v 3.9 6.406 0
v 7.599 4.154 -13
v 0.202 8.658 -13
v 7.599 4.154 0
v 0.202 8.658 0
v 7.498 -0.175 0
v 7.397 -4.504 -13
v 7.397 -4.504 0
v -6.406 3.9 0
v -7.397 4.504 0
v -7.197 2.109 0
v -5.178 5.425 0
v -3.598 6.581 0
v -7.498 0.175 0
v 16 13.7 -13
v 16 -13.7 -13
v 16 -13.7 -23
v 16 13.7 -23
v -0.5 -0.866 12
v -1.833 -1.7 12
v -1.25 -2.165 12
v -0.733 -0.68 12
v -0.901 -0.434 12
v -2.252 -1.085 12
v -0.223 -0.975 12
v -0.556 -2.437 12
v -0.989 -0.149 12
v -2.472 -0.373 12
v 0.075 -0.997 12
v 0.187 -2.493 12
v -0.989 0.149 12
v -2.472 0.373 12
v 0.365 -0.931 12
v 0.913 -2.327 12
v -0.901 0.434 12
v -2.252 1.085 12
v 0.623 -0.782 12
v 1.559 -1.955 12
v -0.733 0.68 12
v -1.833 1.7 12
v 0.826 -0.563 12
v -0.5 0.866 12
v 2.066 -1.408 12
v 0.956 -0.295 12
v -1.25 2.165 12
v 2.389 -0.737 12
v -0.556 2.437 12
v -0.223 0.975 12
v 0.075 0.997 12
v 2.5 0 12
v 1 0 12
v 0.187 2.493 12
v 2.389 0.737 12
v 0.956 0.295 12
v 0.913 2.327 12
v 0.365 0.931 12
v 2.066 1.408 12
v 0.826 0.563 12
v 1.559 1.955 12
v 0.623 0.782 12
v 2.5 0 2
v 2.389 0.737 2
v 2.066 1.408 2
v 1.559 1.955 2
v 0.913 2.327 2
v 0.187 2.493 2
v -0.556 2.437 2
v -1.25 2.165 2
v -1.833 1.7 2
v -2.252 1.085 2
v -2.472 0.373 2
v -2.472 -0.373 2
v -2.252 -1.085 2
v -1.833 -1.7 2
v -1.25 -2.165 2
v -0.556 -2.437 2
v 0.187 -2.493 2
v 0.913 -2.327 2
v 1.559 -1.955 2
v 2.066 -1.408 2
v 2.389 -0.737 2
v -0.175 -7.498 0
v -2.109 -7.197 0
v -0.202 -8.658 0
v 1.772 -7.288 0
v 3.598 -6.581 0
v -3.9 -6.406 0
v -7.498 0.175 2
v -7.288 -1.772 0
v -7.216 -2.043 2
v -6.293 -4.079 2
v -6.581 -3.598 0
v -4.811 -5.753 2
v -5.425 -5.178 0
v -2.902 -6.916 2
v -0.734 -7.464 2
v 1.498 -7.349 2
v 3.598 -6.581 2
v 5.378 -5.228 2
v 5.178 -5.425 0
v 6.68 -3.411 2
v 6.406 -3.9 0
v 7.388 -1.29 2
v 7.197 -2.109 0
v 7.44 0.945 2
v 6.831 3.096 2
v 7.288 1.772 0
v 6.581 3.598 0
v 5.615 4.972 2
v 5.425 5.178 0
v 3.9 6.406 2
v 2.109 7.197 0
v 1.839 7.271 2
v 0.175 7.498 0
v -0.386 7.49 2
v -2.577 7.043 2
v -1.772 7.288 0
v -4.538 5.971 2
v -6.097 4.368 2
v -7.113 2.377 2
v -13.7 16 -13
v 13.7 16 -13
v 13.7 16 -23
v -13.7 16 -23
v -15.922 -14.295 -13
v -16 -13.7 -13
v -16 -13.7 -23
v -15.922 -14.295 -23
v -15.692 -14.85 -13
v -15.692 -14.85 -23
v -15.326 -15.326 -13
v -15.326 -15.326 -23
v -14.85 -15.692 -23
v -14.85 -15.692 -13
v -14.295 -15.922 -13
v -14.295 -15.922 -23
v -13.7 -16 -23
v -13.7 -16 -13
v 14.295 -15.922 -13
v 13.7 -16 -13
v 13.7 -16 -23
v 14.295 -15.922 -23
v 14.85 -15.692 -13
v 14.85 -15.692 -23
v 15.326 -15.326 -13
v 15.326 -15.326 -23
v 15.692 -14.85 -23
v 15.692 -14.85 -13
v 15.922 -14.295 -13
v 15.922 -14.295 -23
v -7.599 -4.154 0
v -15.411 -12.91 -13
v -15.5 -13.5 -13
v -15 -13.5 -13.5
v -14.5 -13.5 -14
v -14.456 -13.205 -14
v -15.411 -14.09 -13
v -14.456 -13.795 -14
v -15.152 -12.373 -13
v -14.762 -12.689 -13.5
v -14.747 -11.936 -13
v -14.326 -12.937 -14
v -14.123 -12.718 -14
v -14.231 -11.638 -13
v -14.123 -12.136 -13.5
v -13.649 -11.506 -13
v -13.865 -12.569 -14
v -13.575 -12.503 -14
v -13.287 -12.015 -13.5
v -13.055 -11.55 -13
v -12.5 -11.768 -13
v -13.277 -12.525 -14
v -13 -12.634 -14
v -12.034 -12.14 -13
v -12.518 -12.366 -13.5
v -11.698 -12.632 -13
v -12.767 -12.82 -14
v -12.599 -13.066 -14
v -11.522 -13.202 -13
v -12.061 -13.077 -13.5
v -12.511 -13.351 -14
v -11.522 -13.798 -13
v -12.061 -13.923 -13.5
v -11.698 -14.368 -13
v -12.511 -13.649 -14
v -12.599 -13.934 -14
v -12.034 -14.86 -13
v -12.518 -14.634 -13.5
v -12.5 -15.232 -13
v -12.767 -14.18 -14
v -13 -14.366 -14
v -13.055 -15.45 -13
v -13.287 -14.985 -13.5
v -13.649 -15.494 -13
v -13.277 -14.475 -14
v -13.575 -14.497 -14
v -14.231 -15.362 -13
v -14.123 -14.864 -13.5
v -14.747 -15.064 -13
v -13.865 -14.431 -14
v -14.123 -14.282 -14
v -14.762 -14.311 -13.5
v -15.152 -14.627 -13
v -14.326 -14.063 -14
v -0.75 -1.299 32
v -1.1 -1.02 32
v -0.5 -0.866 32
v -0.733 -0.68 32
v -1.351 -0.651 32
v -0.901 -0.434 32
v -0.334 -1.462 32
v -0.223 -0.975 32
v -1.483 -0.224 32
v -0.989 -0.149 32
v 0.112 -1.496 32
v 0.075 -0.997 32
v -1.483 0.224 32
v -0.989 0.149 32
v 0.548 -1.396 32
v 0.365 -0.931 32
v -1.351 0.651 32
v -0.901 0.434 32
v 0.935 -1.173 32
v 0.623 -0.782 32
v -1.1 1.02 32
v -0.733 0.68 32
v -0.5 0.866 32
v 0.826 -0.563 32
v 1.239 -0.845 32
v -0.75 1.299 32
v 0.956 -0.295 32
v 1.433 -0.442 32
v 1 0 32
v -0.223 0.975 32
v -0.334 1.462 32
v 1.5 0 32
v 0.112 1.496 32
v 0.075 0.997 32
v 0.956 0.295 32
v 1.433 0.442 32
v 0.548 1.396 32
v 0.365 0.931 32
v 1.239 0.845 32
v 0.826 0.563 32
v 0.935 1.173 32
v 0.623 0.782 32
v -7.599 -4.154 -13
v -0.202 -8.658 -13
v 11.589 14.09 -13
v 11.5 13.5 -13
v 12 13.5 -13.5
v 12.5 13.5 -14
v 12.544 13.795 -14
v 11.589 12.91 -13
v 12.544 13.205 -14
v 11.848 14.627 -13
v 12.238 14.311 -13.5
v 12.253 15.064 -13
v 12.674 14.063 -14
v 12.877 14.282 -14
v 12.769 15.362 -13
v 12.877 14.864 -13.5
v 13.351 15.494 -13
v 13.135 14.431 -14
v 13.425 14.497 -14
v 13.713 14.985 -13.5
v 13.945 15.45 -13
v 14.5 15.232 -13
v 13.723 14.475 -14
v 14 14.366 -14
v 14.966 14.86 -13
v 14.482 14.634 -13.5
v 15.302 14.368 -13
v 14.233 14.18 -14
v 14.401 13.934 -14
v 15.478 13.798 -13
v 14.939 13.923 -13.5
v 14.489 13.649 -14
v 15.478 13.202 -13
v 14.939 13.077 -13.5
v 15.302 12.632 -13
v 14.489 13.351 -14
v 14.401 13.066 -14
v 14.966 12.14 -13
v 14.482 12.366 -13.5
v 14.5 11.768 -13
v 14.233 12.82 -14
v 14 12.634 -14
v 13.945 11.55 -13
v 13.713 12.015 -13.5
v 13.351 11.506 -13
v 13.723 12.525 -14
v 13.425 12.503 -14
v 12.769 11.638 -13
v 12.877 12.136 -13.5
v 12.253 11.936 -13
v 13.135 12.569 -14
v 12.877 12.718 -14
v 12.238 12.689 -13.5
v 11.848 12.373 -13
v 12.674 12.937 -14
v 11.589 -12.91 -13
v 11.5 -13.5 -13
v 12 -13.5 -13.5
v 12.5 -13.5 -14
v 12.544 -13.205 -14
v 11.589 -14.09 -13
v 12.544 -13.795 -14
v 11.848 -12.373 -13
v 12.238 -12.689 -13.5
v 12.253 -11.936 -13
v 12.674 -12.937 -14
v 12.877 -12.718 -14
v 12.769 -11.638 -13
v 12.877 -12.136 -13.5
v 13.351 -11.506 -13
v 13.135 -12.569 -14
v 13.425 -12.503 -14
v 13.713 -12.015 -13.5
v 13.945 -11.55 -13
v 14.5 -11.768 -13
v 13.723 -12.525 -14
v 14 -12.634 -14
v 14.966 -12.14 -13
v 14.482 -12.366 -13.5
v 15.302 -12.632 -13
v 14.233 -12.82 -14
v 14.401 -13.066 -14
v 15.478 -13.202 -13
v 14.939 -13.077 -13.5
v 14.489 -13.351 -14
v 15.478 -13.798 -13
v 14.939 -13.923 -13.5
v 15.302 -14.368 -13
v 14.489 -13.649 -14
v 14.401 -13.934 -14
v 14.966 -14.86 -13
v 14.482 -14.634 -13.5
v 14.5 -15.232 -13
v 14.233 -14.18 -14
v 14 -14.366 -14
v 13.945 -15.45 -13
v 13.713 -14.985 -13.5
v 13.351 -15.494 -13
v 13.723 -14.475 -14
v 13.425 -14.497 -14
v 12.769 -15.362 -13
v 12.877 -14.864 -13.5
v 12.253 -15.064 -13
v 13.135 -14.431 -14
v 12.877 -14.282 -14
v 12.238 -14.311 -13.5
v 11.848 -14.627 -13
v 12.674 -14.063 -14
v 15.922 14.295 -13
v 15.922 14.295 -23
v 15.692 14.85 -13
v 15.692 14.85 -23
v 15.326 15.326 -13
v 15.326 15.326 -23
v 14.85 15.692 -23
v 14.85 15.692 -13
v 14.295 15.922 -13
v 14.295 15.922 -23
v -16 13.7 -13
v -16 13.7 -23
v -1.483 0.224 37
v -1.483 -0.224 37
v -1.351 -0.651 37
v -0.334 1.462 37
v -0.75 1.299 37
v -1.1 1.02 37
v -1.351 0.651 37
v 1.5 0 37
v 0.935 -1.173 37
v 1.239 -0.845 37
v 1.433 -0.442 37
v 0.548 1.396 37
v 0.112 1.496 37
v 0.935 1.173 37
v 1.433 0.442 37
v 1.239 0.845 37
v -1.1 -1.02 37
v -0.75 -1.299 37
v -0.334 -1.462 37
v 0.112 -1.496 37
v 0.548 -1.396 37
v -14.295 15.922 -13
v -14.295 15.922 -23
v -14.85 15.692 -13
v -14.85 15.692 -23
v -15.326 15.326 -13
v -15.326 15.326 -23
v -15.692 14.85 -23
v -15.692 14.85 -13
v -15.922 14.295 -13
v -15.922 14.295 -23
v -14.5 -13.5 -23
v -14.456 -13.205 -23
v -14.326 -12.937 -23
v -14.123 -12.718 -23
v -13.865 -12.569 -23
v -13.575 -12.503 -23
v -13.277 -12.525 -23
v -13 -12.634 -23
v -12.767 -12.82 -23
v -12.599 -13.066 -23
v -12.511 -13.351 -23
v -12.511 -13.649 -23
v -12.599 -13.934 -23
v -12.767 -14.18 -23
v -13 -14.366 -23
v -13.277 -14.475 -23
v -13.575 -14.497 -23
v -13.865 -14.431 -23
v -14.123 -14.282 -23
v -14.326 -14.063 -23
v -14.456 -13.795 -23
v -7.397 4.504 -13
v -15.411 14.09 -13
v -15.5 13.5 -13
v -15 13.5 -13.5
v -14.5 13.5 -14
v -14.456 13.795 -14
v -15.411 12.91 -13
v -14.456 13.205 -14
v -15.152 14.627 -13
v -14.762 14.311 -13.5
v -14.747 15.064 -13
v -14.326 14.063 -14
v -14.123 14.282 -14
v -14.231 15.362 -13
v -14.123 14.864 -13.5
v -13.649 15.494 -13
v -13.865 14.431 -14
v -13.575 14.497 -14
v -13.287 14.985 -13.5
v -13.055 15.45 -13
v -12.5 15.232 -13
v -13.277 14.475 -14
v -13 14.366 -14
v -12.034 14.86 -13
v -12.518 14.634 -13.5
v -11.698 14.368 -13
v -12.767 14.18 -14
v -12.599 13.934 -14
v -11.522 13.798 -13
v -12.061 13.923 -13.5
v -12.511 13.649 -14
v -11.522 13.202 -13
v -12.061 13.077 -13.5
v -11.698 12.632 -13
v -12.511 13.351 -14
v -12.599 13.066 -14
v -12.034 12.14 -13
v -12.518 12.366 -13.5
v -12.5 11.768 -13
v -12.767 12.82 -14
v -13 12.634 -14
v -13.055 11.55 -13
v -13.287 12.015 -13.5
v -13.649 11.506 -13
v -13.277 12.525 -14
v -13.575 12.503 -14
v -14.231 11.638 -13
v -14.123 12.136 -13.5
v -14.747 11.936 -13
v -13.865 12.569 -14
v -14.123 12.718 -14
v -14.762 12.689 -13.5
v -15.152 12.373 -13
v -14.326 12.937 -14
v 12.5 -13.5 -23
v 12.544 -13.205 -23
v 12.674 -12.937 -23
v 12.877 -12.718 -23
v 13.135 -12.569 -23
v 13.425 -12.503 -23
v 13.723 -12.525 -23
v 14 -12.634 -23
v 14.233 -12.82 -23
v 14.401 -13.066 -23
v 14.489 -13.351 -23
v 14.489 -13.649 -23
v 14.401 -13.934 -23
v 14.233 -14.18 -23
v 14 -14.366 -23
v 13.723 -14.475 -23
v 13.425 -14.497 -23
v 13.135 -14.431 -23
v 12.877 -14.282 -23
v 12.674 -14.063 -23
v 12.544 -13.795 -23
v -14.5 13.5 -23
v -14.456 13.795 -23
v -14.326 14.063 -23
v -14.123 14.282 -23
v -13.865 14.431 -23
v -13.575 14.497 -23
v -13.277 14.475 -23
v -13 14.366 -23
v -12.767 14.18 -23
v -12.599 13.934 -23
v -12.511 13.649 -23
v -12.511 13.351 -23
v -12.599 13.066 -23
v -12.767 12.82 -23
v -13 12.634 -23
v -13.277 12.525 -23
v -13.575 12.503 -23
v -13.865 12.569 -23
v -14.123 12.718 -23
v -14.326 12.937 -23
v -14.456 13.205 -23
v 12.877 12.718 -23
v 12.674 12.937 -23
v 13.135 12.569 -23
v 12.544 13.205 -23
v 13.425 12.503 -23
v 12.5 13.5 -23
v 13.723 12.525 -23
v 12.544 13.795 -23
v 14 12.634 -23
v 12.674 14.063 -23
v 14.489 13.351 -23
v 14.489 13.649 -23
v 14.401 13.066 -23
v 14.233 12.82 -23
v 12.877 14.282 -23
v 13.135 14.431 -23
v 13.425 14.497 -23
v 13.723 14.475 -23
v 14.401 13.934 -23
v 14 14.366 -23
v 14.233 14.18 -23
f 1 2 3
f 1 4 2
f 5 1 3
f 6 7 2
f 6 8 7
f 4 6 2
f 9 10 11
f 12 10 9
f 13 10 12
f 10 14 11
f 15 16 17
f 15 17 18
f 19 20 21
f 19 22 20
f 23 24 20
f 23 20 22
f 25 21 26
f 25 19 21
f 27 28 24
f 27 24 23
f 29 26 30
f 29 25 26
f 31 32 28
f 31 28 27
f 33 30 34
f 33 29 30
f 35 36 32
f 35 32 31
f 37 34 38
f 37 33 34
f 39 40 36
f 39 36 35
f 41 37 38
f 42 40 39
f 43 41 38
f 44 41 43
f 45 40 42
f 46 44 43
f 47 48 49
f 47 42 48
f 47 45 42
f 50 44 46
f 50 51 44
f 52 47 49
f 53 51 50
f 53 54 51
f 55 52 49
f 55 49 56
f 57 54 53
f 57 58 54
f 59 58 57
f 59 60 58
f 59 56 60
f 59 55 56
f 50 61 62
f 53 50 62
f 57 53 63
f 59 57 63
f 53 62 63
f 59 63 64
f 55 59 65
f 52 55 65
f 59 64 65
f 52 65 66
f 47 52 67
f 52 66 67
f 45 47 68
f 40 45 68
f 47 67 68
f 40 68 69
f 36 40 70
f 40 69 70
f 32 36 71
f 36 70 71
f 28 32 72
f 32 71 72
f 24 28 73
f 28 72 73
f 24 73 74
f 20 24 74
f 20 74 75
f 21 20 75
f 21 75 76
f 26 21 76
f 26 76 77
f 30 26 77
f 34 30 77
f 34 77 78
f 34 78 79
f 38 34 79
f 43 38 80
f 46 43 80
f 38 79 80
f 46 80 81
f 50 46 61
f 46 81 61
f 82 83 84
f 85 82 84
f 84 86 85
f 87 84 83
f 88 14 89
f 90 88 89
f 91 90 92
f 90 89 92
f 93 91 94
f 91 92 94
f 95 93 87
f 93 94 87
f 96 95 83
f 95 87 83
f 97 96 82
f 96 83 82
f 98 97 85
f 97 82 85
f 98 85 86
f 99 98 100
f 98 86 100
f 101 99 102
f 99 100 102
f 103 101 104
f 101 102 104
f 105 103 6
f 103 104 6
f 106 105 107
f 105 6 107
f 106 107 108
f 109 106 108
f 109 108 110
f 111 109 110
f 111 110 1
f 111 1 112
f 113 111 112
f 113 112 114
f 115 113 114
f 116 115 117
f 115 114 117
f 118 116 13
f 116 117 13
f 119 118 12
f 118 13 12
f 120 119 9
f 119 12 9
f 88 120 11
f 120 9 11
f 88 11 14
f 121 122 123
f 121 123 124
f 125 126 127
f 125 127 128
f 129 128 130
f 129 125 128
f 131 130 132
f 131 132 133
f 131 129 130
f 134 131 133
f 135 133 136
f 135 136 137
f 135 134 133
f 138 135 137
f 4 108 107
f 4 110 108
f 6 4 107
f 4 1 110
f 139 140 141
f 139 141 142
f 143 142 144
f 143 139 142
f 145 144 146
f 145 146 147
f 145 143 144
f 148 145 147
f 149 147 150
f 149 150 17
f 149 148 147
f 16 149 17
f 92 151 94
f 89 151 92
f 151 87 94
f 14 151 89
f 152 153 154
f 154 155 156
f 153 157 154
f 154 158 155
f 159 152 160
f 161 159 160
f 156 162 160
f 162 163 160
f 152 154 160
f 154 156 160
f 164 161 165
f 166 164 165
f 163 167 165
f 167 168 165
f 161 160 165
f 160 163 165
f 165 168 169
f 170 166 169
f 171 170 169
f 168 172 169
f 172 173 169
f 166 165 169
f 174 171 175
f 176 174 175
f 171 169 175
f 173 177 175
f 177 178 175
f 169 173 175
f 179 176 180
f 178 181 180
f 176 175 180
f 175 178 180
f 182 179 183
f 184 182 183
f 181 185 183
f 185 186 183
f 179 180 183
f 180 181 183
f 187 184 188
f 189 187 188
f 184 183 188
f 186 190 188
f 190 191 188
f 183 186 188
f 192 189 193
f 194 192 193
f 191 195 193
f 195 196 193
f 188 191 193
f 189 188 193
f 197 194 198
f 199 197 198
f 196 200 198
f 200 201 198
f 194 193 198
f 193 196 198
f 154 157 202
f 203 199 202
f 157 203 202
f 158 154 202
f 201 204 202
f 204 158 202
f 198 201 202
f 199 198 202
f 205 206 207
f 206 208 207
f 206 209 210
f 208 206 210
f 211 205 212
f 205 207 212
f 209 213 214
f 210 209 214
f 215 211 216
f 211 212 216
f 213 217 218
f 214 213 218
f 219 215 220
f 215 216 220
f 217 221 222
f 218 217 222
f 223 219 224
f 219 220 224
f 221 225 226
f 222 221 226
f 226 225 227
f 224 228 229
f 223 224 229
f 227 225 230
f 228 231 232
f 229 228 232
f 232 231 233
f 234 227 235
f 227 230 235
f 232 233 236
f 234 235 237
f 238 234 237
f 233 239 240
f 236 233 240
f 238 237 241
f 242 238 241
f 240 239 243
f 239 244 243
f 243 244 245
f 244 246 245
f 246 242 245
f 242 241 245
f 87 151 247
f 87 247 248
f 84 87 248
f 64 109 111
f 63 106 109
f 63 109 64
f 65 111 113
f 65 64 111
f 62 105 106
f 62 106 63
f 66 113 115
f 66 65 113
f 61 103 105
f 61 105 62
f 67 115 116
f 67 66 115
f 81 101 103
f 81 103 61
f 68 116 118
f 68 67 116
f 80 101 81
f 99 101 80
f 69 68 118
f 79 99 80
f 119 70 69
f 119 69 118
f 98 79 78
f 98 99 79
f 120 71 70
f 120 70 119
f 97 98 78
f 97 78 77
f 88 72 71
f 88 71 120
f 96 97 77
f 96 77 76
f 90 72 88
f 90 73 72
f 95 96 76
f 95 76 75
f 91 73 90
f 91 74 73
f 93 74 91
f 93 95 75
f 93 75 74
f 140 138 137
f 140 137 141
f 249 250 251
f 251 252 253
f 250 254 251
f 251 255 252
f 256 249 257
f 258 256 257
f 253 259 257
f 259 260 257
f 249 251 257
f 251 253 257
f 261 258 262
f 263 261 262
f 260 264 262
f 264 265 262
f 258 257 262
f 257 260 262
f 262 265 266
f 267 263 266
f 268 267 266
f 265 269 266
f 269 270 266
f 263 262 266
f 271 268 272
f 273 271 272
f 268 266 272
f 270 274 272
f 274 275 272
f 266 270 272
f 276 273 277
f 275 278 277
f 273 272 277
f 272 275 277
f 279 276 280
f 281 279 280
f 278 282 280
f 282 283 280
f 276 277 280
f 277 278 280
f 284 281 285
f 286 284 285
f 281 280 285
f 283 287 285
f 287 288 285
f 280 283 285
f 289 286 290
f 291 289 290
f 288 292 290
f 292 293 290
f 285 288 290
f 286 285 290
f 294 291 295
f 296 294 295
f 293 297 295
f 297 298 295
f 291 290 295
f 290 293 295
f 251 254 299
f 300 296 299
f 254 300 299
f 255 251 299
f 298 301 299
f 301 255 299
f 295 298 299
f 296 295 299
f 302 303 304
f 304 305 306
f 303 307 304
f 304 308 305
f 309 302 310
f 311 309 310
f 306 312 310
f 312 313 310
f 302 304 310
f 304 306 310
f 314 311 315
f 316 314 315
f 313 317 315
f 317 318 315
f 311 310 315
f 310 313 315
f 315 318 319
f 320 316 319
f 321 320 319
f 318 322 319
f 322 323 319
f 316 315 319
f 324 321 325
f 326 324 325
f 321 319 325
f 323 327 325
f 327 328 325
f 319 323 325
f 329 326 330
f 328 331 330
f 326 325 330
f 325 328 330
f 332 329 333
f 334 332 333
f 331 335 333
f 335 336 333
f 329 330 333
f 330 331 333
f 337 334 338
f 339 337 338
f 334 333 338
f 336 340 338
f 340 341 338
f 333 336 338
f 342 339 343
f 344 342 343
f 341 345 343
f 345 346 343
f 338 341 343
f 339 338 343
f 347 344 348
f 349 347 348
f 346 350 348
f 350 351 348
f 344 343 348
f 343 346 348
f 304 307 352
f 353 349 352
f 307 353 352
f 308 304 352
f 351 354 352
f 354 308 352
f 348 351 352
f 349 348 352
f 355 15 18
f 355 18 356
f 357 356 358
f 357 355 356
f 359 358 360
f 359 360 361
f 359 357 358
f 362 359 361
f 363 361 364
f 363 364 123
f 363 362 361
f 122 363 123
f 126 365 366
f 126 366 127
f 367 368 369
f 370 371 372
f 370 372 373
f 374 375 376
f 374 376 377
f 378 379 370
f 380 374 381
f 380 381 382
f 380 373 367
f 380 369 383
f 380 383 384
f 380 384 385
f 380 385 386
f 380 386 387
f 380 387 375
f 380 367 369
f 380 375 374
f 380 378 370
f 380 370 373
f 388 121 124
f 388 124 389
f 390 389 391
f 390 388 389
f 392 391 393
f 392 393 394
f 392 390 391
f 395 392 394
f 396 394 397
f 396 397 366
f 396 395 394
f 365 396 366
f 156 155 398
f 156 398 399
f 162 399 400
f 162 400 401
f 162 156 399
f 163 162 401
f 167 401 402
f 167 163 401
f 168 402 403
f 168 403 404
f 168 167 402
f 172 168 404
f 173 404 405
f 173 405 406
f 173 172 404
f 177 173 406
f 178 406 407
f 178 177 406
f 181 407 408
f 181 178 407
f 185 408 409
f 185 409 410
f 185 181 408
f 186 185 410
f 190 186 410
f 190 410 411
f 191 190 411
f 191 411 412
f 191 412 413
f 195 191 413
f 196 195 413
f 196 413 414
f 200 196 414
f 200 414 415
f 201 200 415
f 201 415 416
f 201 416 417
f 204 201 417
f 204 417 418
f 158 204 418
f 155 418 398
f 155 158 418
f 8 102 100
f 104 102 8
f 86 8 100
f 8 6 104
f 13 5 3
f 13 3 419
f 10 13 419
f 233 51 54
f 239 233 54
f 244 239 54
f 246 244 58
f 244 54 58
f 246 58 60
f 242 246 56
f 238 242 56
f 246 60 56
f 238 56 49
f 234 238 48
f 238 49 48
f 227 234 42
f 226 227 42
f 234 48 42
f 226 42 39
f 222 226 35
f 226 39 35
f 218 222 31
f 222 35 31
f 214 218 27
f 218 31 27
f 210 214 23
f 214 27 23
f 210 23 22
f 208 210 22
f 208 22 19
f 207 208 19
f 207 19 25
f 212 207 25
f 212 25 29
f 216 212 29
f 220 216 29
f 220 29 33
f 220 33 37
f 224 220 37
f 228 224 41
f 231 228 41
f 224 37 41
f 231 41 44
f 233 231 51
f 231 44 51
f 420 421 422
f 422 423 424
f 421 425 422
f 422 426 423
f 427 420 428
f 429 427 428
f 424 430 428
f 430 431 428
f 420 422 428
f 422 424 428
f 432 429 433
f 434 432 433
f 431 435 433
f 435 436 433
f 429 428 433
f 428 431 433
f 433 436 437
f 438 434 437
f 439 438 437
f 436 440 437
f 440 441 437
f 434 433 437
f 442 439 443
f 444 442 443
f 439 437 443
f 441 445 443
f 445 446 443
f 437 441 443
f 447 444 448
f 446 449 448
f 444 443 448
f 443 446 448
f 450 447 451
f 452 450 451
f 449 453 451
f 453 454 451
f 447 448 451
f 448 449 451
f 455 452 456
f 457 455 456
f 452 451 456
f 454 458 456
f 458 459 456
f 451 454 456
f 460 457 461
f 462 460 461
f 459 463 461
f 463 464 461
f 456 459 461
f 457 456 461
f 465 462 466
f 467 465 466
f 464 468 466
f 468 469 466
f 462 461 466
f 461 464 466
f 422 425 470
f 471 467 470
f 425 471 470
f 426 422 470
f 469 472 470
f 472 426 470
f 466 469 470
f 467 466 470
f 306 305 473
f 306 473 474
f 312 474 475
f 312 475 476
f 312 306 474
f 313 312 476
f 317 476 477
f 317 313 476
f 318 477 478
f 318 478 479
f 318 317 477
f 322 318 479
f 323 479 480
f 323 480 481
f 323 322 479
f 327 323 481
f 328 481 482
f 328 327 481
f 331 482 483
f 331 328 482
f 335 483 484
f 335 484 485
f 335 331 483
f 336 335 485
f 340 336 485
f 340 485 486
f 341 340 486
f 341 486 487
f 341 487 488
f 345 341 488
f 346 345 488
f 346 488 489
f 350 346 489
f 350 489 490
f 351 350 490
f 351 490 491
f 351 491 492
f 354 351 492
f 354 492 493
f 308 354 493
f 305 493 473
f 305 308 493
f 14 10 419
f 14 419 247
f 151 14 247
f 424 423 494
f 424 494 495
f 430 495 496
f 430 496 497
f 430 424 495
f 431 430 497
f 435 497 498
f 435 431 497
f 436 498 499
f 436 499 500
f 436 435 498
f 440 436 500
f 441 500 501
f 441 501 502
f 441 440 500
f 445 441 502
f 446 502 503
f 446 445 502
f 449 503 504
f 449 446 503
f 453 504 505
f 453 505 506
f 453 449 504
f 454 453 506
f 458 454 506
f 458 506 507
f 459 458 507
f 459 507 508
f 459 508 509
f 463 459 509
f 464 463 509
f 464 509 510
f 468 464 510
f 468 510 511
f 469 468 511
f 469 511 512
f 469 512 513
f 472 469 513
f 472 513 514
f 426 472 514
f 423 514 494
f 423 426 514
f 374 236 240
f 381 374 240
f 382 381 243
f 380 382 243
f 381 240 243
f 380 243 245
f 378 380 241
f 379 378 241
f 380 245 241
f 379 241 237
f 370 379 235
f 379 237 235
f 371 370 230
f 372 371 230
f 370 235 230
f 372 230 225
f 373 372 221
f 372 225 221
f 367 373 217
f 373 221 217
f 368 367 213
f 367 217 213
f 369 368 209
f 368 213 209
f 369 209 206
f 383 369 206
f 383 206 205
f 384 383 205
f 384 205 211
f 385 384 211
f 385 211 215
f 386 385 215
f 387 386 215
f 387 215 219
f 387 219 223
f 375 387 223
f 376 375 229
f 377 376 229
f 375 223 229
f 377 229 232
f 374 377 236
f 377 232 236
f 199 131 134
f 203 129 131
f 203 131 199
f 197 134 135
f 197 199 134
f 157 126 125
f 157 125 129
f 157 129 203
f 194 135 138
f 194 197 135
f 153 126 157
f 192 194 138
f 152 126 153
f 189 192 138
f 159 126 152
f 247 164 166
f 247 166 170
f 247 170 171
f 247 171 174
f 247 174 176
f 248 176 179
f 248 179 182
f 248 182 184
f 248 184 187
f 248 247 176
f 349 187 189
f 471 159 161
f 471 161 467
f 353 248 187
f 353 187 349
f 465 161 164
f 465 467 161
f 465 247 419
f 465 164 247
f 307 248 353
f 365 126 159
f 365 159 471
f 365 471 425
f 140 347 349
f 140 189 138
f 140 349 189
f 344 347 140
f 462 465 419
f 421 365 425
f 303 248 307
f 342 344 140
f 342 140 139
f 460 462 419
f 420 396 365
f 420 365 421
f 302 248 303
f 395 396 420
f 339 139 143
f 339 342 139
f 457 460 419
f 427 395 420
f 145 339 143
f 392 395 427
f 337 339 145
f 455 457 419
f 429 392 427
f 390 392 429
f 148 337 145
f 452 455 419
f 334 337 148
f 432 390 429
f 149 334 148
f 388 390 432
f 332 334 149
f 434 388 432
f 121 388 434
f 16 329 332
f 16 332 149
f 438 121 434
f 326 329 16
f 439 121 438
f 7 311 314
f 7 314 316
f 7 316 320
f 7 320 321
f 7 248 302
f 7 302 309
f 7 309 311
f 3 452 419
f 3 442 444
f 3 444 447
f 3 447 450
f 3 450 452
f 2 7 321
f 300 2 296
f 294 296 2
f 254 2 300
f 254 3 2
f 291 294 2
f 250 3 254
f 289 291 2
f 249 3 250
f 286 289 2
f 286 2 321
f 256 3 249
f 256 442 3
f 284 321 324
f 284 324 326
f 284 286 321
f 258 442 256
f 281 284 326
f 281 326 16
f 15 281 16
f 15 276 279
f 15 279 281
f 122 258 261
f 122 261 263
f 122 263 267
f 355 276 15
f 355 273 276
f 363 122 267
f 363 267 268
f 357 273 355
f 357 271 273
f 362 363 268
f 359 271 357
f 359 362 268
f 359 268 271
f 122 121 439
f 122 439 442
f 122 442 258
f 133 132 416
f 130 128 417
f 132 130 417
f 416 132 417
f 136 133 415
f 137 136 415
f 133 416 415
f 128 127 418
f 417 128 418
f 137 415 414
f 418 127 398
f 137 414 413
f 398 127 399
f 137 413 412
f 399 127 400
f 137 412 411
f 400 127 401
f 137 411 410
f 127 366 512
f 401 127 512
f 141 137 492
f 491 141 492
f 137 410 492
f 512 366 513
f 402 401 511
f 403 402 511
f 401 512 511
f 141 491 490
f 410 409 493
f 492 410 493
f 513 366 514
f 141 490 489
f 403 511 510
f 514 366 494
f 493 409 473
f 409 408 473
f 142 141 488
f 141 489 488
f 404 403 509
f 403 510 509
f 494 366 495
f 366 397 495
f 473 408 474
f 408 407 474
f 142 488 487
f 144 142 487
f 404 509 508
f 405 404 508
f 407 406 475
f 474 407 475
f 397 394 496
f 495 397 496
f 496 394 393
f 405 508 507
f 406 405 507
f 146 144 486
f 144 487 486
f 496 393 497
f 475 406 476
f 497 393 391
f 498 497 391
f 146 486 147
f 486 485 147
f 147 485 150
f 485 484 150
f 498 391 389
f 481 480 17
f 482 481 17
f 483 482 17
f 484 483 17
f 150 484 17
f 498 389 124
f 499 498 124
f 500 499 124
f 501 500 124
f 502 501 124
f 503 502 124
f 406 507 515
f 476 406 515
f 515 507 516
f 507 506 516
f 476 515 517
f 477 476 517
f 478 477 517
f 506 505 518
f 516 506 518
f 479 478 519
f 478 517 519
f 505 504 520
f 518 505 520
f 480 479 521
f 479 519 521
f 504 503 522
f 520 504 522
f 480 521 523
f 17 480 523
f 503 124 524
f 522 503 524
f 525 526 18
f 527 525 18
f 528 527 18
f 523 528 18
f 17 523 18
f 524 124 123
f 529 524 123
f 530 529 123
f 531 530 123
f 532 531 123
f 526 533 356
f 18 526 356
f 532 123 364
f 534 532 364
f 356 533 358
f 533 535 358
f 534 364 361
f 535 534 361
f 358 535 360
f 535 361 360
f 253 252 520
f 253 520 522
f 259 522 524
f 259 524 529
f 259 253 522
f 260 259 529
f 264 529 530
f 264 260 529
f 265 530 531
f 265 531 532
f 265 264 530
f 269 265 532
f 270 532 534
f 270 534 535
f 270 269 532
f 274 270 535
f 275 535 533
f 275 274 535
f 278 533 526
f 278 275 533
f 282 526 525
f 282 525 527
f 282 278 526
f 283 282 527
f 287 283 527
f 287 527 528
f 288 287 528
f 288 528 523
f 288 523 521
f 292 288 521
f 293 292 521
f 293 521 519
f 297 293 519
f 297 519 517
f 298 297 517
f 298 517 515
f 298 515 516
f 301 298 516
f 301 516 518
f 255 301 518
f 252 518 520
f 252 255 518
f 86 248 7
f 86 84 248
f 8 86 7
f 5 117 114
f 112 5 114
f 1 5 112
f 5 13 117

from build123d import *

# Parameters (mm, degrees)
BOSS_EXTRUDE1_DEPTH = 2
SKETCH2_R           = 7.5
BOSS_EXTRUDE2_DEPTH = 2
SKETCH3_R           = 2.5
BOSS_EXTRUDE3_DEPTH = 10
SKETCH4_R           = 1
BOSS_EXTRUDE4_DEPTH = 20
SKETCH5_R           = 1.5
BOSS_EXTRUDE5_DEPTH = 5
BOSS_EXTRUDE6_DEPTH = 11
SKETCH7_R           = 1
BOSS_EXTRUDE7_DEPTH = 10
CHAMFER1_SIZE       = 1


with BuildPart() as part:
    # Sketch1 → Boss-Extrude1 (new body)
    with BuildSketch(Plane.XY):
        Polygon((7.397125851, -4.5036129), (7.598806105, 4.154292452), (0.201680255, 8.657905351), (-7.397125851, 4.5036129), (-7.598806105, -4.154292452), (-0.201680255, -8.657905351), align=None)
    extrude(amount=-BOSS_EXTRUDE1_DEPTH)

    # Sketch2 → Boss-Extrude2 (add)
    with BuildSketch(Plane.XY):
        with Locations(Location((0, 0, 0), (0, 0, 178.665573541))):
            Circle(SKETCH2_R)
    extrude(amount=BOSS_EXTRUDE2_DEPTH)

    # Sketch3 → Boss-Extrude3 (add)
    with BuildSketch(Plane.XY.offset(2)):
        Circle(SKETCH3_R)
    extrude(amount=BOSS_EXTRUDE3_DEPTH)

    # Sketch4 → Boss-Extrude4 (add)
    with BuildSketch(Plane.XY.offset(12)):
        Circle(SKETCH4_R)
    extrude(amount=BOSS_EXTRUDE4_DEPTH)

    # Sketch5 → Boss-Extrude5 (add)
    with BuildSketch(Plane.XY.offset(32)):
        Circle(SKETCH5_R)
    extrude(amount=BOSS_EXTRUDE5_DEPTH)

    # Sketch6 → Boss-Extrude6 (add)
    with BuildSketch(Plane(origin=(0, 0, -2), x_dir=(-1, 0, 0), z_dir=(0, 0, -1))):
        Polygon((-7.598806105, 4.154292452), (-0.201680255, 8.657905351), (7.397125851, 4.5036129), (7.598806105, -4.154292452), (0.201680255, -8.657905351), (-7.397125851, -4.5036129), align=None)
    extrude(amount=BOSS_EXTRUDE6_DEPTH)

    # Sketch7 → Boss-Extrude7 (add)
    with BuildSketch(Plane(origin=(0, 0, -13), x_dir=(-1, 0, 0), z_dir=(0, 0, -1))):
        with BuildLine():
            Line((-13.7, 16), (13.7, 16))
            ThreePointArc((13.7, 16), (15.326345597, 15.326345597), (16, 13.7))
            Line((16, 13.7), (16, -13.7))
            ThreePointArc((16, -13.7), (15.326345597, -15.326345597), (13.7, -16))
            Line((13.7, -16), (-13.7, -16))
            ThreePointArc((-13.7, -16), (-15.326345597, -15.326345597), (-16, -13.7))
            Line((-16, -13.7), (-16, 13.7))
            ThreePointArc((-16, 13.7), (-15.326345597, 15.326345597), (-13.7, 16))
        make_face()
        with Locations((-13.5, 13.5)):
            Circle(SKETCH7_R, mode=Mode.SUBTRACT)
        with Locations((13.5, 13.5)):
            Circle(SKETCH7_R, mode=Mode.SUBTRACT)
        with Locations((13.5, -13.5)):
            Circle(SKETCH7_R, mode=Mode.SUBTRACT)
        with Locations((-13.5, -13.5)):
            Circle(SKETCH7_R, mode=Mode.SUBTRACT)
    extrude(amount=BOSS_EXTRUDE7_DEPTH)

    # Chamfer1
    chamfer1_edges = [part.edges().sort_by_distance(p)[0] for p in [
        (-12.5, -13.5, -13),
        (14.5, 13.5, -13),
        (-12.5, 13.5, -13),
        (14.5, -13.5, -13),
    ]]
    chamfer(chamfer1_edges, length=CHAMFER1_SIZE)


solid = part.part
